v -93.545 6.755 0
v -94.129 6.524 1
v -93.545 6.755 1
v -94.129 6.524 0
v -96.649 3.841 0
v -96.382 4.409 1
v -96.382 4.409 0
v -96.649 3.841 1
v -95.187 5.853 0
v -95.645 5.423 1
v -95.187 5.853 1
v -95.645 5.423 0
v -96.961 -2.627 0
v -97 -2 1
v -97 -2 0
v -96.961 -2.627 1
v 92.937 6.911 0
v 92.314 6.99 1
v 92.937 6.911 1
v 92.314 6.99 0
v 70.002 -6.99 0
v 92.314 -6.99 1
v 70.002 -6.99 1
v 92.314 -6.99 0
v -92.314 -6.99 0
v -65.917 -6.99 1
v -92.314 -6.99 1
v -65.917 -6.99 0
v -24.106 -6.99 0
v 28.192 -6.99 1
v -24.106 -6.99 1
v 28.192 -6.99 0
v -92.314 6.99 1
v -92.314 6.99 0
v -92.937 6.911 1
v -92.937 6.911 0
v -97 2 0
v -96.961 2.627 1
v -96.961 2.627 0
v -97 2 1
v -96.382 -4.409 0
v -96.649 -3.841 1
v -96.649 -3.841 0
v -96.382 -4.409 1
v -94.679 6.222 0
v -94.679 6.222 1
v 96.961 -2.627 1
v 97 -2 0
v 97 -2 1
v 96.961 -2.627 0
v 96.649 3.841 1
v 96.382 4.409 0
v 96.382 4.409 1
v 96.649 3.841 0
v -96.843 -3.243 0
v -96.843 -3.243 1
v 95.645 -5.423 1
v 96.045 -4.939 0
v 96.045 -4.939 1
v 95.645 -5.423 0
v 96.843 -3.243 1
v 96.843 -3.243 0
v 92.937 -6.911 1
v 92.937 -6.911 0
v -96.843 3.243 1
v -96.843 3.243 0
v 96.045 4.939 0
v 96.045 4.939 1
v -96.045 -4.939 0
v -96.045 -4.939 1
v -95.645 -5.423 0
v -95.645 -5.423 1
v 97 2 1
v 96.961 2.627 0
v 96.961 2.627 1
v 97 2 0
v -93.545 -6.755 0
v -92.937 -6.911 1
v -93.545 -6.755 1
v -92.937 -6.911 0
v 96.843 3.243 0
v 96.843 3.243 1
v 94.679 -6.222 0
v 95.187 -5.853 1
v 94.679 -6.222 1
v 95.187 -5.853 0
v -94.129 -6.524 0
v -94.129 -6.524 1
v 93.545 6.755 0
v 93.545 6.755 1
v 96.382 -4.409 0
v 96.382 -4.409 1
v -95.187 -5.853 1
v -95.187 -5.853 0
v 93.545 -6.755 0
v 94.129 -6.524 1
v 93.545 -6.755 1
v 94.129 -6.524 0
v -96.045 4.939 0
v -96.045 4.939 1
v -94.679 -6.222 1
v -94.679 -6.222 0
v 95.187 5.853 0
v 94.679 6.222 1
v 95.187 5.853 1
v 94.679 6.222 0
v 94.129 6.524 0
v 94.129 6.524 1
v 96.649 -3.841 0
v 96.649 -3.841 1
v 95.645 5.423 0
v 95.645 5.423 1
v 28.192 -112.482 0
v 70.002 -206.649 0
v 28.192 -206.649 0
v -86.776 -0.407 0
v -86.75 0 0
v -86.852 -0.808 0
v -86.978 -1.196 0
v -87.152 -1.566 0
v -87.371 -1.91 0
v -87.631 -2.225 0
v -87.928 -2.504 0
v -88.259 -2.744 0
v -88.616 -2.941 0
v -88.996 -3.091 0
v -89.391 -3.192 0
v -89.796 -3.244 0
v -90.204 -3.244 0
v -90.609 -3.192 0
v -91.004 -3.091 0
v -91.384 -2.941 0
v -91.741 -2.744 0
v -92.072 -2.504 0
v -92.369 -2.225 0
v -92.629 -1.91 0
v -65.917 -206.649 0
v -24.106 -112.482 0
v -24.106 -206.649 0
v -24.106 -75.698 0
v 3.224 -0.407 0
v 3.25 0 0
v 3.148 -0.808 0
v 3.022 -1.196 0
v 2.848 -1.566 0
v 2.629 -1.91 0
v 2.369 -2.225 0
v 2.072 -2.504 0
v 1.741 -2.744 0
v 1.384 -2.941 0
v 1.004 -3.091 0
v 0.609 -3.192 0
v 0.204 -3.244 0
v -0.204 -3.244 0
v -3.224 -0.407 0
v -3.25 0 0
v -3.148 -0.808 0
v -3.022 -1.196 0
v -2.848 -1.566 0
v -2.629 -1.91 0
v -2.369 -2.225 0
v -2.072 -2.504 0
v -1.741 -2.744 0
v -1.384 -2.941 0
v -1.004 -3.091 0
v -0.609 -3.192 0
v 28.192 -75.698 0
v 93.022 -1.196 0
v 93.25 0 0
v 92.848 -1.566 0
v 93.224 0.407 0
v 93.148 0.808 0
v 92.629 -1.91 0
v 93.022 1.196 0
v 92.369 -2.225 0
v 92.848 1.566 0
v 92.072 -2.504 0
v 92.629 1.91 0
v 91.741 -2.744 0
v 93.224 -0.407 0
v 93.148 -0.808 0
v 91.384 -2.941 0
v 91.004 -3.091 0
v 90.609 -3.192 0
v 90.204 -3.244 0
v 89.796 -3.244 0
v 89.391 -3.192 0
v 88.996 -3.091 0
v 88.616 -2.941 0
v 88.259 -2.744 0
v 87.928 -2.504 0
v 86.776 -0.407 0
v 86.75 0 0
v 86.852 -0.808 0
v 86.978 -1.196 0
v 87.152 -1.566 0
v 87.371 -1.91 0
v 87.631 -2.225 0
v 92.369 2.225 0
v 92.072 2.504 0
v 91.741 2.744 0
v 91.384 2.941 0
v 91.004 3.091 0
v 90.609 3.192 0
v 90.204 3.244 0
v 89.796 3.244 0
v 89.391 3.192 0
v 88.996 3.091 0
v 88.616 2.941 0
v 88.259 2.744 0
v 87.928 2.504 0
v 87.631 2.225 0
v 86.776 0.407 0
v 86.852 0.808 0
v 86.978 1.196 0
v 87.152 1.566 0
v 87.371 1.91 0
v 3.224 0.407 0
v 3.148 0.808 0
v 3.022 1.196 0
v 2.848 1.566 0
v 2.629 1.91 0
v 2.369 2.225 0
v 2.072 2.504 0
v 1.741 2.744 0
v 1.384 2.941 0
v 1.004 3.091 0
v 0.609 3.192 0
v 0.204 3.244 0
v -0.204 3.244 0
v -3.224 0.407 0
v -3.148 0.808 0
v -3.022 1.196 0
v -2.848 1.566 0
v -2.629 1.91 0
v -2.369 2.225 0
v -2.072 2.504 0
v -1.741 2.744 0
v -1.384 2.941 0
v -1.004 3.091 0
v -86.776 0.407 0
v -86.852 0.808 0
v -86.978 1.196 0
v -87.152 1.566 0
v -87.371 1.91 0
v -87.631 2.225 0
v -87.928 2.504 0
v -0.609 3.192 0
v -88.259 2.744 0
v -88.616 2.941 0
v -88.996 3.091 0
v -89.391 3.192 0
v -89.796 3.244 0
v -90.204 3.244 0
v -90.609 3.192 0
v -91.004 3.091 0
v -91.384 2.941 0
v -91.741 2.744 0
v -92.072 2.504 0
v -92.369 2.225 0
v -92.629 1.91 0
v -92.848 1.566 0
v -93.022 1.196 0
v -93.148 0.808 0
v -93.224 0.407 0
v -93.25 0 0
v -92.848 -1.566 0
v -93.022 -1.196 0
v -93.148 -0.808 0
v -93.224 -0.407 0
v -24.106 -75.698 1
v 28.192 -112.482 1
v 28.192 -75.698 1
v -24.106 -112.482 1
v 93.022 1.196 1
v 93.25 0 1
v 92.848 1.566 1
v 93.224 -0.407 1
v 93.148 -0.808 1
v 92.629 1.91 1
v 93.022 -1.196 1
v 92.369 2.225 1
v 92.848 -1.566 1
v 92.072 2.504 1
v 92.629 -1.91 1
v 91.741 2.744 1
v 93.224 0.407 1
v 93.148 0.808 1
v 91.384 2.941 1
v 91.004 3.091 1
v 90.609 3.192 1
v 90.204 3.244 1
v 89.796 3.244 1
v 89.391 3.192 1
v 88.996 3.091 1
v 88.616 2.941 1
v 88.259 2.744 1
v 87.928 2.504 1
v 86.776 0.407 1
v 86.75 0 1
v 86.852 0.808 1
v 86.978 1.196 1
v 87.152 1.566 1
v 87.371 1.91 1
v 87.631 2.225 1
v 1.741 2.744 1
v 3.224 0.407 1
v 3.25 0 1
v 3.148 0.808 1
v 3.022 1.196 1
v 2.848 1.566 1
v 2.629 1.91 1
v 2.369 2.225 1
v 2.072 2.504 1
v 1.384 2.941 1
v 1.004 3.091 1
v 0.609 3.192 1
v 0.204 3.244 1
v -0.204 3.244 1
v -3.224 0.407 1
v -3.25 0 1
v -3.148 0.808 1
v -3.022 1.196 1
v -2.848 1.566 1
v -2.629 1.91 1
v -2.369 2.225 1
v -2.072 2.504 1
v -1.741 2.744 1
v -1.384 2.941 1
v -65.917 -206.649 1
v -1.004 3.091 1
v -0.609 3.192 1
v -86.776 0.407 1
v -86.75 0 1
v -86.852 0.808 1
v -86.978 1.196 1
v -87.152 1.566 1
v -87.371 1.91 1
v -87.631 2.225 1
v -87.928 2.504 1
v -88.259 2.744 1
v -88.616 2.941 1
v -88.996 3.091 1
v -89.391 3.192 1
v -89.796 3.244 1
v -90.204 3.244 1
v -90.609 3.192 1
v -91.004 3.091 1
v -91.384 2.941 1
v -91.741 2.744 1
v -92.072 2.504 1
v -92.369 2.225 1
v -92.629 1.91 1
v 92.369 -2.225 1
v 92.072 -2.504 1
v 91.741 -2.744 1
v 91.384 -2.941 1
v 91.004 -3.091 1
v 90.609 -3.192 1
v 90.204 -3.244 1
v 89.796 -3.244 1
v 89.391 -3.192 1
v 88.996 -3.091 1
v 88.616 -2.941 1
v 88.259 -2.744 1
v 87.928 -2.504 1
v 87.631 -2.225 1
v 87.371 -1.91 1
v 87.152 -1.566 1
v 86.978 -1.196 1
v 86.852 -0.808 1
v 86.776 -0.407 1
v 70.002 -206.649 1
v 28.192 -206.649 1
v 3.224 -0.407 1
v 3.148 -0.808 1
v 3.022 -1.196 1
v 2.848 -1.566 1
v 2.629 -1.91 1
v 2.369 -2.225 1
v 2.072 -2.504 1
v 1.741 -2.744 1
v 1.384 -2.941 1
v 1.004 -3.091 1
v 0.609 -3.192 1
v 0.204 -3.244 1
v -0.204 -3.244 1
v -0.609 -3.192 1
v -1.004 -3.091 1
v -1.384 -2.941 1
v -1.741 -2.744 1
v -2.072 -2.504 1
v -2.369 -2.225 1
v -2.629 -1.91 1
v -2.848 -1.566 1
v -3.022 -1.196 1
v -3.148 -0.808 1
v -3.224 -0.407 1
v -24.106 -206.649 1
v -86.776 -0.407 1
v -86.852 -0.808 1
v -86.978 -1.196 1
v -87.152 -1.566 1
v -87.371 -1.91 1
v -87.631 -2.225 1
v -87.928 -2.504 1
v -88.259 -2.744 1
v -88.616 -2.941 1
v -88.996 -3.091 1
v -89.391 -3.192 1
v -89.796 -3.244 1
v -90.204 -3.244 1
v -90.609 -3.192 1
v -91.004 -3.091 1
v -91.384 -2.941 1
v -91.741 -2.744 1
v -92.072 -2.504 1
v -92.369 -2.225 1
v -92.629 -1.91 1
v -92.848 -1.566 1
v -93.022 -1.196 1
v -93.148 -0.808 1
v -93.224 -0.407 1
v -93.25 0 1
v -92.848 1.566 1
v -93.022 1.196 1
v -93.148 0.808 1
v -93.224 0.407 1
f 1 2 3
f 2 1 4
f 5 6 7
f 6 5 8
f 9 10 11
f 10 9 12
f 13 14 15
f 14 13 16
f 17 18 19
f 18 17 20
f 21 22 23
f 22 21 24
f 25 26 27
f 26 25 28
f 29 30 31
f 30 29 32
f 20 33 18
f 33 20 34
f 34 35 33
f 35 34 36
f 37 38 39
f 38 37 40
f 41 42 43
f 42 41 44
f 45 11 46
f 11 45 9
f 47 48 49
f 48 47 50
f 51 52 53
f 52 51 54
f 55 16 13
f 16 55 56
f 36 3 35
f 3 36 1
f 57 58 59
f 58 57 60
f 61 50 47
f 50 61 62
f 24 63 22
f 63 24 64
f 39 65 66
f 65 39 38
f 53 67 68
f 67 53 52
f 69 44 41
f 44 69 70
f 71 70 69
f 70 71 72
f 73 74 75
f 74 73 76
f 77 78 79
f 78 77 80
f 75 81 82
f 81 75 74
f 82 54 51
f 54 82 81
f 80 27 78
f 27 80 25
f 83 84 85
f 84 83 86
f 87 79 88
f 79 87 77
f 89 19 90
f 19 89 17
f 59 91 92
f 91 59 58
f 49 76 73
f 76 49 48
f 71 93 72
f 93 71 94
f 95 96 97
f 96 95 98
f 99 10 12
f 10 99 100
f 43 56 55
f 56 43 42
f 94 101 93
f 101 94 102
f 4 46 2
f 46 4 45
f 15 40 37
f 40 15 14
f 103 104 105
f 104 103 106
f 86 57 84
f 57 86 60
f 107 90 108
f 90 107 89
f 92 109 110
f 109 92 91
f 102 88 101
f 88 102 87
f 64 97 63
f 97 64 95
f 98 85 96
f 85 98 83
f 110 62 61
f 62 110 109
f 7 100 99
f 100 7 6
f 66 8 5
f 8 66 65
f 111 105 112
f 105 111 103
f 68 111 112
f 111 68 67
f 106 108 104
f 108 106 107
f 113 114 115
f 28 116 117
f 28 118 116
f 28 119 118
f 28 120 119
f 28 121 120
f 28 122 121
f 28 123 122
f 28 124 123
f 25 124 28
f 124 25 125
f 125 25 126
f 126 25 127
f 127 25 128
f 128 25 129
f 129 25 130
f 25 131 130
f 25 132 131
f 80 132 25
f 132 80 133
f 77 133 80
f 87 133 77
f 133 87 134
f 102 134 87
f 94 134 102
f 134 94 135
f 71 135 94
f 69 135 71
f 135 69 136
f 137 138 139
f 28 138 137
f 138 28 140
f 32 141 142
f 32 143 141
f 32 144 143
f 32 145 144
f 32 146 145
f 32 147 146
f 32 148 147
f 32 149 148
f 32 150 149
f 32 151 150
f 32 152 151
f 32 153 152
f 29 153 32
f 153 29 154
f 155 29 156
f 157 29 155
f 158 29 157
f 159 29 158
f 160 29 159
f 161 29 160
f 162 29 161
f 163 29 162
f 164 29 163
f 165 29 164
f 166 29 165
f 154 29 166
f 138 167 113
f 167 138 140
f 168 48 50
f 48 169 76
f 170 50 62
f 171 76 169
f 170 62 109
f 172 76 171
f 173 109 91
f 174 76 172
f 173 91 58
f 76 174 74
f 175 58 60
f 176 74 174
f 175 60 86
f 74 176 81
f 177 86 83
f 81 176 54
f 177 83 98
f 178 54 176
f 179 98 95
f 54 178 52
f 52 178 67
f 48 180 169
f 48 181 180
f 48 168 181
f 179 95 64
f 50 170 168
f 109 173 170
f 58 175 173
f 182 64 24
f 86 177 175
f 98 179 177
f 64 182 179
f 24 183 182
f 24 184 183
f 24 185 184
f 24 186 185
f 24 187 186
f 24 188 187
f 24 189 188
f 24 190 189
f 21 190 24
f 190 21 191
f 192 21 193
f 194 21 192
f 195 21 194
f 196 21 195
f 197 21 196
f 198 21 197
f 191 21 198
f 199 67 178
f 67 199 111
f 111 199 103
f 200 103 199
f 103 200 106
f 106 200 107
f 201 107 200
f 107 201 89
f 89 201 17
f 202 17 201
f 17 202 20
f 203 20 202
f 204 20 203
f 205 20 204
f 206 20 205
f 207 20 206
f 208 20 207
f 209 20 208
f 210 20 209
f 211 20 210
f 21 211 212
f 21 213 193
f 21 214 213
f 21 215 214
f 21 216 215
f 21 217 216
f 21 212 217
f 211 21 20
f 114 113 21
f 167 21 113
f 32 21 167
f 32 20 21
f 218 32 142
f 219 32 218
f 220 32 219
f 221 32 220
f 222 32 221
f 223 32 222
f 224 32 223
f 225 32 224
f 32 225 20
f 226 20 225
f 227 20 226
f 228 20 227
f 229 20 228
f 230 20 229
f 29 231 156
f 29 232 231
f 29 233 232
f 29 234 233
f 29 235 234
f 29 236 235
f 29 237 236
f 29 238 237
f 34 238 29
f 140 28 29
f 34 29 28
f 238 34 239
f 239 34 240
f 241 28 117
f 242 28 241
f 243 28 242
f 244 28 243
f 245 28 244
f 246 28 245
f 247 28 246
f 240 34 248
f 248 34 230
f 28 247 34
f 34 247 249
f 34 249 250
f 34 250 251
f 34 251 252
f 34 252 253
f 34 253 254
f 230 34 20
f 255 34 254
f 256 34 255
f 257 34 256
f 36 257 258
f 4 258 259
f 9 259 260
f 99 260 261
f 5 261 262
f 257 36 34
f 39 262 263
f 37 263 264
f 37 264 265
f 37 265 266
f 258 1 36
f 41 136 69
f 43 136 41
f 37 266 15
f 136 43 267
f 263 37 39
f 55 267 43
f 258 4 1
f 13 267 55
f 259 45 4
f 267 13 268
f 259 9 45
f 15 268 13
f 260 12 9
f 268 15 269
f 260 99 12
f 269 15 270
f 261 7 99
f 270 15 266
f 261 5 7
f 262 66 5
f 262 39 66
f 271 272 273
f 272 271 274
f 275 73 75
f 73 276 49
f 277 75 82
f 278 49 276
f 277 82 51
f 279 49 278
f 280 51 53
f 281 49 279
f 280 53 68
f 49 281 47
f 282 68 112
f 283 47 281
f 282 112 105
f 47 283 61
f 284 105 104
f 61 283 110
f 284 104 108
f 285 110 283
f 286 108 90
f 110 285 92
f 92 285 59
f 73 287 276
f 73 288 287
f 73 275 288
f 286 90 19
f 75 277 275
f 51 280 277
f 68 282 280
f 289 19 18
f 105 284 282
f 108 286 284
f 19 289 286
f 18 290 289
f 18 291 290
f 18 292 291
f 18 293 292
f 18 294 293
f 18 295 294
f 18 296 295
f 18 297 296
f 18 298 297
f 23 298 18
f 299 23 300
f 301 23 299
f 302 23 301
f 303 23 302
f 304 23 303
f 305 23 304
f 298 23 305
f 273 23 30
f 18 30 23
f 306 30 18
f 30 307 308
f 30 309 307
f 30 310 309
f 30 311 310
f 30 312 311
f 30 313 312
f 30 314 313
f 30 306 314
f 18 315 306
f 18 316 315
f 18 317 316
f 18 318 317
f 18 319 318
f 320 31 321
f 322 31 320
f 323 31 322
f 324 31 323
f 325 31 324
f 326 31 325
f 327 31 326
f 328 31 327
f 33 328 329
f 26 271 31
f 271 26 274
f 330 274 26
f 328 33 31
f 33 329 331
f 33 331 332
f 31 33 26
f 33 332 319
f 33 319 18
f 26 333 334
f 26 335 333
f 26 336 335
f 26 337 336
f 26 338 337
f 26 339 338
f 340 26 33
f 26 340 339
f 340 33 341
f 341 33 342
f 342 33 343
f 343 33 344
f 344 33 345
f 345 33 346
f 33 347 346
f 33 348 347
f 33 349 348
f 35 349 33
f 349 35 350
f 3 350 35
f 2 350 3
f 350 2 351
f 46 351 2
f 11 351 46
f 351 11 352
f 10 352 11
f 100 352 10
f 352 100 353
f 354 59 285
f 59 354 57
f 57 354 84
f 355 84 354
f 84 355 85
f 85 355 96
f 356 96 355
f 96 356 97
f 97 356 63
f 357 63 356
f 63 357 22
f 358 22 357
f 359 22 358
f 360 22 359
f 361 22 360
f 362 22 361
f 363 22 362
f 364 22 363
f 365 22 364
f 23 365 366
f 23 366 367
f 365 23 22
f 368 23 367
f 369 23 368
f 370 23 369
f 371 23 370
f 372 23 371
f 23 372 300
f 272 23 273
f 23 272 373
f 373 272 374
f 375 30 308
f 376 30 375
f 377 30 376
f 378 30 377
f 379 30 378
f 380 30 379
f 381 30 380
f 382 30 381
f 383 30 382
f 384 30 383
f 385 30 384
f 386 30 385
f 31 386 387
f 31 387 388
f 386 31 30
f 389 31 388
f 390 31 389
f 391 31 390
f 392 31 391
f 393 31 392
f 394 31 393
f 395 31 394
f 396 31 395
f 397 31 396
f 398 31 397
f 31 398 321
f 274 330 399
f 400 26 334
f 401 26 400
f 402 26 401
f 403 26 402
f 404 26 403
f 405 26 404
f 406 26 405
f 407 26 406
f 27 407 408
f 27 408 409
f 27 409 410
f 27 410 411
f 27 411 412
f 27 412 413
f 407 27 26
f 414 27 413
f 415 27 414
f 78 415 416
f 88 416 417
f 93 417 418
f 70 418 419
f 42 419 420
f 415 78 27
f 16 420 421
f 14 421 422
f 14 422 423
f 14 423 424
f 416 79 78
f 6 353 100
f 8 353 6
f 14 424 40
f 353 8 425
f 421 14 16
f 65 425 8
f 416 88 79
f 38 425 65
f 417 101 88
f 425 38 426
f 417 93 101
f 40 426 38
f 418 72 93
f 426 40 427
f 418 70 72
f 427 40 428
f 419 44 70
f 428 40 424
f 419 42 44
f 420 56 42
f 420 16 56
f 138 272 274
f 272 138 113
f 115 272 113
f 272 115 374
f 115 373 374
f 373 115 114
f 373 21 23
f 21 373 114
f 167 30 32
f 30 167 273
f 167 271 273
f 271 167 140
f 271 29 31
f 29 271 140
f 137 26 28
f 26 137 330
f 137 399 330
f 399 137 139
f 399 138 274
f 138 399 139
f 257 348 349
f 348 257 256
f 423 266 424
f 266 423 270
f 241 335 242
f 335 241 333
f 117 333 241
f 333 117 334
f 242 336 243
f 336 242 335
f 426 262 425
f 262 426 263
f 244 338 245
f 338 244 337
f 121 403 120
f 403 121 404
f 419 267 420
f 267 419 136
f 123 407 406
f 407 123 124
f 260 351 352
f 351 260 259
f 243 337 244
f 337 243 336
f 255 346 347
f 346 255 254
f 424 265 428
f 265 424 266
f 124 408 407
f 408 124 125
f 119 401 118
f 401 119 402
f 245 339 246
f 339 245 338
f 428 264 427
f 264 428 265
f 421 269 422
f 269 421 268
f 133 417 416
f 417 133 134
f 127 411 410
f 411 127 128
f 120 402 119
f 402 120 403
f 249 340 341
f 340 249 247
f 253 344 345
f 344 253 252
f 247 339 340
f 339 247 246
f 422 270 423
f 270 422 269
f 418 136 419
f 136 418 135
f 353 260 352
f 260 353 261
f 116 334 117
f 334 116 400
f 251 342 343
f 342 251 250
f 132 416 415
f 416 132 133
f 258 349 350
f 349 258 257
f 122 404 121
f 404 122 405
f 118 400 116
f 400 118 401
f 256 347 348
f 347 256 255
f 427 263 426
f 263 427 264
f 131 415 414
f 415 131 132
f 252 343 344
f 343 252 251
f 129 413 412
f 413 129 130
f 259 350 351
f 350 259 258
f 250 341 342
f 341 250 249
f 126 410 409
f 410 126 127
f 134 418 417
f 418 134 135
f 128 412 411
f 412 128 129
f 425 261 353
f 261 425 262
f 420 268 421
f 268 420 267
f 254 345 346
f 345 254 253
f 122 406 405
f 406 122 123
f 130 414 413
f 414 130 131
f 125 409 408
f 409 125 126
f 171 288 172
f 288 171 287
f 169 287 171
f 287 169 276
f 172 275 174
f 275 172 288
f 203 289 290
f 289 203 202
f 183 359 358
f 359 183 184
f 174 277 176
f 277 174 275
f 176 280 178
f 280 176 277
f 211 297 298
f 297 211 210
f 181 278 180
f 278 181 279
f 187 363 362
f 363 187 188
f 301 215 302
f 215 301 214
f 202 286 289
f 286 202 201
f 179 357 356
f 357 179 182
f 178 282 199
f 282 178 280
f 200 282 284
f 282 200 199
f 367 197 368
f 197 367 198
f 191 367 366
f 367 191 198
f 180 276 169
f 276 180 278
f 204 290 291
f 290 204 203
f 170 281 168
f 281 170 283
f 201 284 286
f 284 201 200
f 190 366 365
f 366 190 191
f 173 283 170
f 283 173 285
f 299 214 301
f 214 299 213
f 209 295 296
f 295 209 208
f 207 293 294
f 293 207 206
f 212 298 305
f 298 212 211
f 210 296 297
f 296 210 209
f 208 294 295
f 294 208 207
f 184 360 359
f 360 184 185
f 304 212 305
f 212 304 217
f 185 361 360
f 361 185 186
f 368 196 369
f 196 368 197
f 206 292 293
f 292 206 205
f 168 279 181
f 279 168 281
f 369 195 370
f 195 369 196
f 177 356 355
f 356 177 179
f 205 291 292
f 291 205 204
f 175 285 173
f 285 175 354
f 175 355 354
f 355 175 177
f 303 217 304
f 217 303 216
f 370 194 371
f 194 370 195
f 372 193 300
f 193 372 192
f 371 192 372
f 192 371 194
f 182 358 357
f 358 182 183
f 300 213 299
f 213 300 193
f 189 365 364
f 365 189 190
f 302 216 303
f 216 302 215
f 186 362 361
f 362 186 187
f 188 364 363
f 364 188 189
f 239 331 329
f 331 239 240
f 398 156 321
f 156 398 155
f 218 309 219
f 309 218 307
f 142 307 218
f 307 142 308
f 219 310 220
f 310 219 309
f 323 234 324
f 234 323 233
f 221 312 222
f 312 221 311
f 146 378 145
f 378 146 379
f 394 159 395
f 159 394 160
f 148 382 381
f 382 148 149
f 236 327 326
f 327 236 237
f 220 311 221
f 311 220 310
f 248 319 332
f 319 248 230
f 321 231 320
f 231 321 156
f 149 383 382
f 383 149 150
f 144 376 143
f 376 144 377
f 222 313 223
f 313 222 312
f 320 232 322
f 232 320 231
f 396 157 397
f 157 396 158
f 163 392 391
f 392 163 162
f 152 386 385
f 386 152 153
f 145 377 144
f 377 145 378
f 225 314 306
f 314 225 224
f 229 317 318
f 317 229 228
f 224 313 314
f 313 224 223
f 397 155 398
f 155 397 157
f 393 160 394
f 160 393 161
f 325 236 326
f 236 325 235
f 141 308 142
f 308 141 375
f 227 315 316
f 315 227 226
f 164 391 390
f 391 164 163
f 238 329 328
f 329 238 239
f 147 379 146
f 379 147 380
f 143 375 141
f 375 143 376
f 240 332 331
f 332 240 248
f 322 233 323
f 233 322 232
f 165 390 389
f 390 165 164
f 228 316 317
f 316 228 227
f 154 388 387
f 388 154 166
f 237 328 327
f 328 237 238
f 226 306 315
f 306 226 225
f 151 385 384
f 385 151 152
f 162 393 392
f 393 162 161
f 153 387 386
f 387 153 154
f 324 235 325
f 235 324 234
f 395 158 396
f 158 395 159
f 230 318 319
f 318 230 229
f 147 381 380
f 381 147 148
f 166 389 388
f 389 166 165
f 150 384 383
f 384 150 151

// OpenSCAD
$fn = 50;


difference() {
	union() {
		translate(v = [0, 0, 0]) {
			rotate(a = [0, 0, 0]) {
				hull() {
					translate(v = [-92.0000000000, 2.0000000000, 0]) {
						rotate(a = [0, 0, 0]) {
							translate(v = [0, 0, 0]) {
								rotate(a = [0, 0, 0]) {
									cylinder(h = 1, r = 5);
								}
							}
						}
					}
					translate(v = [92.0000000000, 2.0000000000, 0]) {
						rotate(a = [0, 0, 0]) {
							translate(v = [0, 0, 0]) {
								rotate(a = [0, 0, 0]) {
									cylinder(h = 1, r = 5);
								}
							}
						}
					}
					translate(v = [-92.0000000000, -2.0000000000, 0]) {
						rotate(a = [0, 0, 0]) {
							translate(v = [0, 0, 0]) {
								rotate(a = [0, 0, 0]) {
									cylinder(h = 1, r = 5);
								}
							}
						}
					}
					translate(v = [92.0000000000, -2.0000000000, 0]) {
						rotate(a = [0, 0, 0]) {
							translate(v = [0, 0, 0]) {
								rotate(a = [0, 0, 0]) {
									cylinder(h = 1, r = 5);
								}
							}
						}
					}
				}
			}
		}
		translate(v = [0, 0, 0]) {
			rotate(a = [0, 0, 0]) {
				linear_extrude(height = 1) {
					text(font = "DejaVu Sans Mono:style=Bold", halign = "center", size = 209.0000000000, text = "H", valign = "top");
				}
			}
		}
	}
	union() {
		translate(v = [-90.0000000000, 0.0000000000, -125.0000000000]) {
			rotate(a = [0, 0, 0]) {
				cylinder(h = 250, r = 3.2500000000);
			}
		}
		translate(v = [90.0000000000, 0.0000000000, -125.0000000000]) {
			rotate(a = [0, 0, 0]) {
				cylinder(h = 250, r = 3.2500000000);
			}
		}
		translate(v = [90.0000000000, 0.0000000000, -125.0000000000]) {
			rotate(a = [0, 0, 0]) {
				cylinder(h = 250, r = 3.2500000000);
			}
		}
		translate(v = [0, 0, -125.0000000000]) {
			rotate(a = [0, 0, 0]) {
				cylinder(h = 250, r = 3.2500000000);
			}
		}
	}
}
